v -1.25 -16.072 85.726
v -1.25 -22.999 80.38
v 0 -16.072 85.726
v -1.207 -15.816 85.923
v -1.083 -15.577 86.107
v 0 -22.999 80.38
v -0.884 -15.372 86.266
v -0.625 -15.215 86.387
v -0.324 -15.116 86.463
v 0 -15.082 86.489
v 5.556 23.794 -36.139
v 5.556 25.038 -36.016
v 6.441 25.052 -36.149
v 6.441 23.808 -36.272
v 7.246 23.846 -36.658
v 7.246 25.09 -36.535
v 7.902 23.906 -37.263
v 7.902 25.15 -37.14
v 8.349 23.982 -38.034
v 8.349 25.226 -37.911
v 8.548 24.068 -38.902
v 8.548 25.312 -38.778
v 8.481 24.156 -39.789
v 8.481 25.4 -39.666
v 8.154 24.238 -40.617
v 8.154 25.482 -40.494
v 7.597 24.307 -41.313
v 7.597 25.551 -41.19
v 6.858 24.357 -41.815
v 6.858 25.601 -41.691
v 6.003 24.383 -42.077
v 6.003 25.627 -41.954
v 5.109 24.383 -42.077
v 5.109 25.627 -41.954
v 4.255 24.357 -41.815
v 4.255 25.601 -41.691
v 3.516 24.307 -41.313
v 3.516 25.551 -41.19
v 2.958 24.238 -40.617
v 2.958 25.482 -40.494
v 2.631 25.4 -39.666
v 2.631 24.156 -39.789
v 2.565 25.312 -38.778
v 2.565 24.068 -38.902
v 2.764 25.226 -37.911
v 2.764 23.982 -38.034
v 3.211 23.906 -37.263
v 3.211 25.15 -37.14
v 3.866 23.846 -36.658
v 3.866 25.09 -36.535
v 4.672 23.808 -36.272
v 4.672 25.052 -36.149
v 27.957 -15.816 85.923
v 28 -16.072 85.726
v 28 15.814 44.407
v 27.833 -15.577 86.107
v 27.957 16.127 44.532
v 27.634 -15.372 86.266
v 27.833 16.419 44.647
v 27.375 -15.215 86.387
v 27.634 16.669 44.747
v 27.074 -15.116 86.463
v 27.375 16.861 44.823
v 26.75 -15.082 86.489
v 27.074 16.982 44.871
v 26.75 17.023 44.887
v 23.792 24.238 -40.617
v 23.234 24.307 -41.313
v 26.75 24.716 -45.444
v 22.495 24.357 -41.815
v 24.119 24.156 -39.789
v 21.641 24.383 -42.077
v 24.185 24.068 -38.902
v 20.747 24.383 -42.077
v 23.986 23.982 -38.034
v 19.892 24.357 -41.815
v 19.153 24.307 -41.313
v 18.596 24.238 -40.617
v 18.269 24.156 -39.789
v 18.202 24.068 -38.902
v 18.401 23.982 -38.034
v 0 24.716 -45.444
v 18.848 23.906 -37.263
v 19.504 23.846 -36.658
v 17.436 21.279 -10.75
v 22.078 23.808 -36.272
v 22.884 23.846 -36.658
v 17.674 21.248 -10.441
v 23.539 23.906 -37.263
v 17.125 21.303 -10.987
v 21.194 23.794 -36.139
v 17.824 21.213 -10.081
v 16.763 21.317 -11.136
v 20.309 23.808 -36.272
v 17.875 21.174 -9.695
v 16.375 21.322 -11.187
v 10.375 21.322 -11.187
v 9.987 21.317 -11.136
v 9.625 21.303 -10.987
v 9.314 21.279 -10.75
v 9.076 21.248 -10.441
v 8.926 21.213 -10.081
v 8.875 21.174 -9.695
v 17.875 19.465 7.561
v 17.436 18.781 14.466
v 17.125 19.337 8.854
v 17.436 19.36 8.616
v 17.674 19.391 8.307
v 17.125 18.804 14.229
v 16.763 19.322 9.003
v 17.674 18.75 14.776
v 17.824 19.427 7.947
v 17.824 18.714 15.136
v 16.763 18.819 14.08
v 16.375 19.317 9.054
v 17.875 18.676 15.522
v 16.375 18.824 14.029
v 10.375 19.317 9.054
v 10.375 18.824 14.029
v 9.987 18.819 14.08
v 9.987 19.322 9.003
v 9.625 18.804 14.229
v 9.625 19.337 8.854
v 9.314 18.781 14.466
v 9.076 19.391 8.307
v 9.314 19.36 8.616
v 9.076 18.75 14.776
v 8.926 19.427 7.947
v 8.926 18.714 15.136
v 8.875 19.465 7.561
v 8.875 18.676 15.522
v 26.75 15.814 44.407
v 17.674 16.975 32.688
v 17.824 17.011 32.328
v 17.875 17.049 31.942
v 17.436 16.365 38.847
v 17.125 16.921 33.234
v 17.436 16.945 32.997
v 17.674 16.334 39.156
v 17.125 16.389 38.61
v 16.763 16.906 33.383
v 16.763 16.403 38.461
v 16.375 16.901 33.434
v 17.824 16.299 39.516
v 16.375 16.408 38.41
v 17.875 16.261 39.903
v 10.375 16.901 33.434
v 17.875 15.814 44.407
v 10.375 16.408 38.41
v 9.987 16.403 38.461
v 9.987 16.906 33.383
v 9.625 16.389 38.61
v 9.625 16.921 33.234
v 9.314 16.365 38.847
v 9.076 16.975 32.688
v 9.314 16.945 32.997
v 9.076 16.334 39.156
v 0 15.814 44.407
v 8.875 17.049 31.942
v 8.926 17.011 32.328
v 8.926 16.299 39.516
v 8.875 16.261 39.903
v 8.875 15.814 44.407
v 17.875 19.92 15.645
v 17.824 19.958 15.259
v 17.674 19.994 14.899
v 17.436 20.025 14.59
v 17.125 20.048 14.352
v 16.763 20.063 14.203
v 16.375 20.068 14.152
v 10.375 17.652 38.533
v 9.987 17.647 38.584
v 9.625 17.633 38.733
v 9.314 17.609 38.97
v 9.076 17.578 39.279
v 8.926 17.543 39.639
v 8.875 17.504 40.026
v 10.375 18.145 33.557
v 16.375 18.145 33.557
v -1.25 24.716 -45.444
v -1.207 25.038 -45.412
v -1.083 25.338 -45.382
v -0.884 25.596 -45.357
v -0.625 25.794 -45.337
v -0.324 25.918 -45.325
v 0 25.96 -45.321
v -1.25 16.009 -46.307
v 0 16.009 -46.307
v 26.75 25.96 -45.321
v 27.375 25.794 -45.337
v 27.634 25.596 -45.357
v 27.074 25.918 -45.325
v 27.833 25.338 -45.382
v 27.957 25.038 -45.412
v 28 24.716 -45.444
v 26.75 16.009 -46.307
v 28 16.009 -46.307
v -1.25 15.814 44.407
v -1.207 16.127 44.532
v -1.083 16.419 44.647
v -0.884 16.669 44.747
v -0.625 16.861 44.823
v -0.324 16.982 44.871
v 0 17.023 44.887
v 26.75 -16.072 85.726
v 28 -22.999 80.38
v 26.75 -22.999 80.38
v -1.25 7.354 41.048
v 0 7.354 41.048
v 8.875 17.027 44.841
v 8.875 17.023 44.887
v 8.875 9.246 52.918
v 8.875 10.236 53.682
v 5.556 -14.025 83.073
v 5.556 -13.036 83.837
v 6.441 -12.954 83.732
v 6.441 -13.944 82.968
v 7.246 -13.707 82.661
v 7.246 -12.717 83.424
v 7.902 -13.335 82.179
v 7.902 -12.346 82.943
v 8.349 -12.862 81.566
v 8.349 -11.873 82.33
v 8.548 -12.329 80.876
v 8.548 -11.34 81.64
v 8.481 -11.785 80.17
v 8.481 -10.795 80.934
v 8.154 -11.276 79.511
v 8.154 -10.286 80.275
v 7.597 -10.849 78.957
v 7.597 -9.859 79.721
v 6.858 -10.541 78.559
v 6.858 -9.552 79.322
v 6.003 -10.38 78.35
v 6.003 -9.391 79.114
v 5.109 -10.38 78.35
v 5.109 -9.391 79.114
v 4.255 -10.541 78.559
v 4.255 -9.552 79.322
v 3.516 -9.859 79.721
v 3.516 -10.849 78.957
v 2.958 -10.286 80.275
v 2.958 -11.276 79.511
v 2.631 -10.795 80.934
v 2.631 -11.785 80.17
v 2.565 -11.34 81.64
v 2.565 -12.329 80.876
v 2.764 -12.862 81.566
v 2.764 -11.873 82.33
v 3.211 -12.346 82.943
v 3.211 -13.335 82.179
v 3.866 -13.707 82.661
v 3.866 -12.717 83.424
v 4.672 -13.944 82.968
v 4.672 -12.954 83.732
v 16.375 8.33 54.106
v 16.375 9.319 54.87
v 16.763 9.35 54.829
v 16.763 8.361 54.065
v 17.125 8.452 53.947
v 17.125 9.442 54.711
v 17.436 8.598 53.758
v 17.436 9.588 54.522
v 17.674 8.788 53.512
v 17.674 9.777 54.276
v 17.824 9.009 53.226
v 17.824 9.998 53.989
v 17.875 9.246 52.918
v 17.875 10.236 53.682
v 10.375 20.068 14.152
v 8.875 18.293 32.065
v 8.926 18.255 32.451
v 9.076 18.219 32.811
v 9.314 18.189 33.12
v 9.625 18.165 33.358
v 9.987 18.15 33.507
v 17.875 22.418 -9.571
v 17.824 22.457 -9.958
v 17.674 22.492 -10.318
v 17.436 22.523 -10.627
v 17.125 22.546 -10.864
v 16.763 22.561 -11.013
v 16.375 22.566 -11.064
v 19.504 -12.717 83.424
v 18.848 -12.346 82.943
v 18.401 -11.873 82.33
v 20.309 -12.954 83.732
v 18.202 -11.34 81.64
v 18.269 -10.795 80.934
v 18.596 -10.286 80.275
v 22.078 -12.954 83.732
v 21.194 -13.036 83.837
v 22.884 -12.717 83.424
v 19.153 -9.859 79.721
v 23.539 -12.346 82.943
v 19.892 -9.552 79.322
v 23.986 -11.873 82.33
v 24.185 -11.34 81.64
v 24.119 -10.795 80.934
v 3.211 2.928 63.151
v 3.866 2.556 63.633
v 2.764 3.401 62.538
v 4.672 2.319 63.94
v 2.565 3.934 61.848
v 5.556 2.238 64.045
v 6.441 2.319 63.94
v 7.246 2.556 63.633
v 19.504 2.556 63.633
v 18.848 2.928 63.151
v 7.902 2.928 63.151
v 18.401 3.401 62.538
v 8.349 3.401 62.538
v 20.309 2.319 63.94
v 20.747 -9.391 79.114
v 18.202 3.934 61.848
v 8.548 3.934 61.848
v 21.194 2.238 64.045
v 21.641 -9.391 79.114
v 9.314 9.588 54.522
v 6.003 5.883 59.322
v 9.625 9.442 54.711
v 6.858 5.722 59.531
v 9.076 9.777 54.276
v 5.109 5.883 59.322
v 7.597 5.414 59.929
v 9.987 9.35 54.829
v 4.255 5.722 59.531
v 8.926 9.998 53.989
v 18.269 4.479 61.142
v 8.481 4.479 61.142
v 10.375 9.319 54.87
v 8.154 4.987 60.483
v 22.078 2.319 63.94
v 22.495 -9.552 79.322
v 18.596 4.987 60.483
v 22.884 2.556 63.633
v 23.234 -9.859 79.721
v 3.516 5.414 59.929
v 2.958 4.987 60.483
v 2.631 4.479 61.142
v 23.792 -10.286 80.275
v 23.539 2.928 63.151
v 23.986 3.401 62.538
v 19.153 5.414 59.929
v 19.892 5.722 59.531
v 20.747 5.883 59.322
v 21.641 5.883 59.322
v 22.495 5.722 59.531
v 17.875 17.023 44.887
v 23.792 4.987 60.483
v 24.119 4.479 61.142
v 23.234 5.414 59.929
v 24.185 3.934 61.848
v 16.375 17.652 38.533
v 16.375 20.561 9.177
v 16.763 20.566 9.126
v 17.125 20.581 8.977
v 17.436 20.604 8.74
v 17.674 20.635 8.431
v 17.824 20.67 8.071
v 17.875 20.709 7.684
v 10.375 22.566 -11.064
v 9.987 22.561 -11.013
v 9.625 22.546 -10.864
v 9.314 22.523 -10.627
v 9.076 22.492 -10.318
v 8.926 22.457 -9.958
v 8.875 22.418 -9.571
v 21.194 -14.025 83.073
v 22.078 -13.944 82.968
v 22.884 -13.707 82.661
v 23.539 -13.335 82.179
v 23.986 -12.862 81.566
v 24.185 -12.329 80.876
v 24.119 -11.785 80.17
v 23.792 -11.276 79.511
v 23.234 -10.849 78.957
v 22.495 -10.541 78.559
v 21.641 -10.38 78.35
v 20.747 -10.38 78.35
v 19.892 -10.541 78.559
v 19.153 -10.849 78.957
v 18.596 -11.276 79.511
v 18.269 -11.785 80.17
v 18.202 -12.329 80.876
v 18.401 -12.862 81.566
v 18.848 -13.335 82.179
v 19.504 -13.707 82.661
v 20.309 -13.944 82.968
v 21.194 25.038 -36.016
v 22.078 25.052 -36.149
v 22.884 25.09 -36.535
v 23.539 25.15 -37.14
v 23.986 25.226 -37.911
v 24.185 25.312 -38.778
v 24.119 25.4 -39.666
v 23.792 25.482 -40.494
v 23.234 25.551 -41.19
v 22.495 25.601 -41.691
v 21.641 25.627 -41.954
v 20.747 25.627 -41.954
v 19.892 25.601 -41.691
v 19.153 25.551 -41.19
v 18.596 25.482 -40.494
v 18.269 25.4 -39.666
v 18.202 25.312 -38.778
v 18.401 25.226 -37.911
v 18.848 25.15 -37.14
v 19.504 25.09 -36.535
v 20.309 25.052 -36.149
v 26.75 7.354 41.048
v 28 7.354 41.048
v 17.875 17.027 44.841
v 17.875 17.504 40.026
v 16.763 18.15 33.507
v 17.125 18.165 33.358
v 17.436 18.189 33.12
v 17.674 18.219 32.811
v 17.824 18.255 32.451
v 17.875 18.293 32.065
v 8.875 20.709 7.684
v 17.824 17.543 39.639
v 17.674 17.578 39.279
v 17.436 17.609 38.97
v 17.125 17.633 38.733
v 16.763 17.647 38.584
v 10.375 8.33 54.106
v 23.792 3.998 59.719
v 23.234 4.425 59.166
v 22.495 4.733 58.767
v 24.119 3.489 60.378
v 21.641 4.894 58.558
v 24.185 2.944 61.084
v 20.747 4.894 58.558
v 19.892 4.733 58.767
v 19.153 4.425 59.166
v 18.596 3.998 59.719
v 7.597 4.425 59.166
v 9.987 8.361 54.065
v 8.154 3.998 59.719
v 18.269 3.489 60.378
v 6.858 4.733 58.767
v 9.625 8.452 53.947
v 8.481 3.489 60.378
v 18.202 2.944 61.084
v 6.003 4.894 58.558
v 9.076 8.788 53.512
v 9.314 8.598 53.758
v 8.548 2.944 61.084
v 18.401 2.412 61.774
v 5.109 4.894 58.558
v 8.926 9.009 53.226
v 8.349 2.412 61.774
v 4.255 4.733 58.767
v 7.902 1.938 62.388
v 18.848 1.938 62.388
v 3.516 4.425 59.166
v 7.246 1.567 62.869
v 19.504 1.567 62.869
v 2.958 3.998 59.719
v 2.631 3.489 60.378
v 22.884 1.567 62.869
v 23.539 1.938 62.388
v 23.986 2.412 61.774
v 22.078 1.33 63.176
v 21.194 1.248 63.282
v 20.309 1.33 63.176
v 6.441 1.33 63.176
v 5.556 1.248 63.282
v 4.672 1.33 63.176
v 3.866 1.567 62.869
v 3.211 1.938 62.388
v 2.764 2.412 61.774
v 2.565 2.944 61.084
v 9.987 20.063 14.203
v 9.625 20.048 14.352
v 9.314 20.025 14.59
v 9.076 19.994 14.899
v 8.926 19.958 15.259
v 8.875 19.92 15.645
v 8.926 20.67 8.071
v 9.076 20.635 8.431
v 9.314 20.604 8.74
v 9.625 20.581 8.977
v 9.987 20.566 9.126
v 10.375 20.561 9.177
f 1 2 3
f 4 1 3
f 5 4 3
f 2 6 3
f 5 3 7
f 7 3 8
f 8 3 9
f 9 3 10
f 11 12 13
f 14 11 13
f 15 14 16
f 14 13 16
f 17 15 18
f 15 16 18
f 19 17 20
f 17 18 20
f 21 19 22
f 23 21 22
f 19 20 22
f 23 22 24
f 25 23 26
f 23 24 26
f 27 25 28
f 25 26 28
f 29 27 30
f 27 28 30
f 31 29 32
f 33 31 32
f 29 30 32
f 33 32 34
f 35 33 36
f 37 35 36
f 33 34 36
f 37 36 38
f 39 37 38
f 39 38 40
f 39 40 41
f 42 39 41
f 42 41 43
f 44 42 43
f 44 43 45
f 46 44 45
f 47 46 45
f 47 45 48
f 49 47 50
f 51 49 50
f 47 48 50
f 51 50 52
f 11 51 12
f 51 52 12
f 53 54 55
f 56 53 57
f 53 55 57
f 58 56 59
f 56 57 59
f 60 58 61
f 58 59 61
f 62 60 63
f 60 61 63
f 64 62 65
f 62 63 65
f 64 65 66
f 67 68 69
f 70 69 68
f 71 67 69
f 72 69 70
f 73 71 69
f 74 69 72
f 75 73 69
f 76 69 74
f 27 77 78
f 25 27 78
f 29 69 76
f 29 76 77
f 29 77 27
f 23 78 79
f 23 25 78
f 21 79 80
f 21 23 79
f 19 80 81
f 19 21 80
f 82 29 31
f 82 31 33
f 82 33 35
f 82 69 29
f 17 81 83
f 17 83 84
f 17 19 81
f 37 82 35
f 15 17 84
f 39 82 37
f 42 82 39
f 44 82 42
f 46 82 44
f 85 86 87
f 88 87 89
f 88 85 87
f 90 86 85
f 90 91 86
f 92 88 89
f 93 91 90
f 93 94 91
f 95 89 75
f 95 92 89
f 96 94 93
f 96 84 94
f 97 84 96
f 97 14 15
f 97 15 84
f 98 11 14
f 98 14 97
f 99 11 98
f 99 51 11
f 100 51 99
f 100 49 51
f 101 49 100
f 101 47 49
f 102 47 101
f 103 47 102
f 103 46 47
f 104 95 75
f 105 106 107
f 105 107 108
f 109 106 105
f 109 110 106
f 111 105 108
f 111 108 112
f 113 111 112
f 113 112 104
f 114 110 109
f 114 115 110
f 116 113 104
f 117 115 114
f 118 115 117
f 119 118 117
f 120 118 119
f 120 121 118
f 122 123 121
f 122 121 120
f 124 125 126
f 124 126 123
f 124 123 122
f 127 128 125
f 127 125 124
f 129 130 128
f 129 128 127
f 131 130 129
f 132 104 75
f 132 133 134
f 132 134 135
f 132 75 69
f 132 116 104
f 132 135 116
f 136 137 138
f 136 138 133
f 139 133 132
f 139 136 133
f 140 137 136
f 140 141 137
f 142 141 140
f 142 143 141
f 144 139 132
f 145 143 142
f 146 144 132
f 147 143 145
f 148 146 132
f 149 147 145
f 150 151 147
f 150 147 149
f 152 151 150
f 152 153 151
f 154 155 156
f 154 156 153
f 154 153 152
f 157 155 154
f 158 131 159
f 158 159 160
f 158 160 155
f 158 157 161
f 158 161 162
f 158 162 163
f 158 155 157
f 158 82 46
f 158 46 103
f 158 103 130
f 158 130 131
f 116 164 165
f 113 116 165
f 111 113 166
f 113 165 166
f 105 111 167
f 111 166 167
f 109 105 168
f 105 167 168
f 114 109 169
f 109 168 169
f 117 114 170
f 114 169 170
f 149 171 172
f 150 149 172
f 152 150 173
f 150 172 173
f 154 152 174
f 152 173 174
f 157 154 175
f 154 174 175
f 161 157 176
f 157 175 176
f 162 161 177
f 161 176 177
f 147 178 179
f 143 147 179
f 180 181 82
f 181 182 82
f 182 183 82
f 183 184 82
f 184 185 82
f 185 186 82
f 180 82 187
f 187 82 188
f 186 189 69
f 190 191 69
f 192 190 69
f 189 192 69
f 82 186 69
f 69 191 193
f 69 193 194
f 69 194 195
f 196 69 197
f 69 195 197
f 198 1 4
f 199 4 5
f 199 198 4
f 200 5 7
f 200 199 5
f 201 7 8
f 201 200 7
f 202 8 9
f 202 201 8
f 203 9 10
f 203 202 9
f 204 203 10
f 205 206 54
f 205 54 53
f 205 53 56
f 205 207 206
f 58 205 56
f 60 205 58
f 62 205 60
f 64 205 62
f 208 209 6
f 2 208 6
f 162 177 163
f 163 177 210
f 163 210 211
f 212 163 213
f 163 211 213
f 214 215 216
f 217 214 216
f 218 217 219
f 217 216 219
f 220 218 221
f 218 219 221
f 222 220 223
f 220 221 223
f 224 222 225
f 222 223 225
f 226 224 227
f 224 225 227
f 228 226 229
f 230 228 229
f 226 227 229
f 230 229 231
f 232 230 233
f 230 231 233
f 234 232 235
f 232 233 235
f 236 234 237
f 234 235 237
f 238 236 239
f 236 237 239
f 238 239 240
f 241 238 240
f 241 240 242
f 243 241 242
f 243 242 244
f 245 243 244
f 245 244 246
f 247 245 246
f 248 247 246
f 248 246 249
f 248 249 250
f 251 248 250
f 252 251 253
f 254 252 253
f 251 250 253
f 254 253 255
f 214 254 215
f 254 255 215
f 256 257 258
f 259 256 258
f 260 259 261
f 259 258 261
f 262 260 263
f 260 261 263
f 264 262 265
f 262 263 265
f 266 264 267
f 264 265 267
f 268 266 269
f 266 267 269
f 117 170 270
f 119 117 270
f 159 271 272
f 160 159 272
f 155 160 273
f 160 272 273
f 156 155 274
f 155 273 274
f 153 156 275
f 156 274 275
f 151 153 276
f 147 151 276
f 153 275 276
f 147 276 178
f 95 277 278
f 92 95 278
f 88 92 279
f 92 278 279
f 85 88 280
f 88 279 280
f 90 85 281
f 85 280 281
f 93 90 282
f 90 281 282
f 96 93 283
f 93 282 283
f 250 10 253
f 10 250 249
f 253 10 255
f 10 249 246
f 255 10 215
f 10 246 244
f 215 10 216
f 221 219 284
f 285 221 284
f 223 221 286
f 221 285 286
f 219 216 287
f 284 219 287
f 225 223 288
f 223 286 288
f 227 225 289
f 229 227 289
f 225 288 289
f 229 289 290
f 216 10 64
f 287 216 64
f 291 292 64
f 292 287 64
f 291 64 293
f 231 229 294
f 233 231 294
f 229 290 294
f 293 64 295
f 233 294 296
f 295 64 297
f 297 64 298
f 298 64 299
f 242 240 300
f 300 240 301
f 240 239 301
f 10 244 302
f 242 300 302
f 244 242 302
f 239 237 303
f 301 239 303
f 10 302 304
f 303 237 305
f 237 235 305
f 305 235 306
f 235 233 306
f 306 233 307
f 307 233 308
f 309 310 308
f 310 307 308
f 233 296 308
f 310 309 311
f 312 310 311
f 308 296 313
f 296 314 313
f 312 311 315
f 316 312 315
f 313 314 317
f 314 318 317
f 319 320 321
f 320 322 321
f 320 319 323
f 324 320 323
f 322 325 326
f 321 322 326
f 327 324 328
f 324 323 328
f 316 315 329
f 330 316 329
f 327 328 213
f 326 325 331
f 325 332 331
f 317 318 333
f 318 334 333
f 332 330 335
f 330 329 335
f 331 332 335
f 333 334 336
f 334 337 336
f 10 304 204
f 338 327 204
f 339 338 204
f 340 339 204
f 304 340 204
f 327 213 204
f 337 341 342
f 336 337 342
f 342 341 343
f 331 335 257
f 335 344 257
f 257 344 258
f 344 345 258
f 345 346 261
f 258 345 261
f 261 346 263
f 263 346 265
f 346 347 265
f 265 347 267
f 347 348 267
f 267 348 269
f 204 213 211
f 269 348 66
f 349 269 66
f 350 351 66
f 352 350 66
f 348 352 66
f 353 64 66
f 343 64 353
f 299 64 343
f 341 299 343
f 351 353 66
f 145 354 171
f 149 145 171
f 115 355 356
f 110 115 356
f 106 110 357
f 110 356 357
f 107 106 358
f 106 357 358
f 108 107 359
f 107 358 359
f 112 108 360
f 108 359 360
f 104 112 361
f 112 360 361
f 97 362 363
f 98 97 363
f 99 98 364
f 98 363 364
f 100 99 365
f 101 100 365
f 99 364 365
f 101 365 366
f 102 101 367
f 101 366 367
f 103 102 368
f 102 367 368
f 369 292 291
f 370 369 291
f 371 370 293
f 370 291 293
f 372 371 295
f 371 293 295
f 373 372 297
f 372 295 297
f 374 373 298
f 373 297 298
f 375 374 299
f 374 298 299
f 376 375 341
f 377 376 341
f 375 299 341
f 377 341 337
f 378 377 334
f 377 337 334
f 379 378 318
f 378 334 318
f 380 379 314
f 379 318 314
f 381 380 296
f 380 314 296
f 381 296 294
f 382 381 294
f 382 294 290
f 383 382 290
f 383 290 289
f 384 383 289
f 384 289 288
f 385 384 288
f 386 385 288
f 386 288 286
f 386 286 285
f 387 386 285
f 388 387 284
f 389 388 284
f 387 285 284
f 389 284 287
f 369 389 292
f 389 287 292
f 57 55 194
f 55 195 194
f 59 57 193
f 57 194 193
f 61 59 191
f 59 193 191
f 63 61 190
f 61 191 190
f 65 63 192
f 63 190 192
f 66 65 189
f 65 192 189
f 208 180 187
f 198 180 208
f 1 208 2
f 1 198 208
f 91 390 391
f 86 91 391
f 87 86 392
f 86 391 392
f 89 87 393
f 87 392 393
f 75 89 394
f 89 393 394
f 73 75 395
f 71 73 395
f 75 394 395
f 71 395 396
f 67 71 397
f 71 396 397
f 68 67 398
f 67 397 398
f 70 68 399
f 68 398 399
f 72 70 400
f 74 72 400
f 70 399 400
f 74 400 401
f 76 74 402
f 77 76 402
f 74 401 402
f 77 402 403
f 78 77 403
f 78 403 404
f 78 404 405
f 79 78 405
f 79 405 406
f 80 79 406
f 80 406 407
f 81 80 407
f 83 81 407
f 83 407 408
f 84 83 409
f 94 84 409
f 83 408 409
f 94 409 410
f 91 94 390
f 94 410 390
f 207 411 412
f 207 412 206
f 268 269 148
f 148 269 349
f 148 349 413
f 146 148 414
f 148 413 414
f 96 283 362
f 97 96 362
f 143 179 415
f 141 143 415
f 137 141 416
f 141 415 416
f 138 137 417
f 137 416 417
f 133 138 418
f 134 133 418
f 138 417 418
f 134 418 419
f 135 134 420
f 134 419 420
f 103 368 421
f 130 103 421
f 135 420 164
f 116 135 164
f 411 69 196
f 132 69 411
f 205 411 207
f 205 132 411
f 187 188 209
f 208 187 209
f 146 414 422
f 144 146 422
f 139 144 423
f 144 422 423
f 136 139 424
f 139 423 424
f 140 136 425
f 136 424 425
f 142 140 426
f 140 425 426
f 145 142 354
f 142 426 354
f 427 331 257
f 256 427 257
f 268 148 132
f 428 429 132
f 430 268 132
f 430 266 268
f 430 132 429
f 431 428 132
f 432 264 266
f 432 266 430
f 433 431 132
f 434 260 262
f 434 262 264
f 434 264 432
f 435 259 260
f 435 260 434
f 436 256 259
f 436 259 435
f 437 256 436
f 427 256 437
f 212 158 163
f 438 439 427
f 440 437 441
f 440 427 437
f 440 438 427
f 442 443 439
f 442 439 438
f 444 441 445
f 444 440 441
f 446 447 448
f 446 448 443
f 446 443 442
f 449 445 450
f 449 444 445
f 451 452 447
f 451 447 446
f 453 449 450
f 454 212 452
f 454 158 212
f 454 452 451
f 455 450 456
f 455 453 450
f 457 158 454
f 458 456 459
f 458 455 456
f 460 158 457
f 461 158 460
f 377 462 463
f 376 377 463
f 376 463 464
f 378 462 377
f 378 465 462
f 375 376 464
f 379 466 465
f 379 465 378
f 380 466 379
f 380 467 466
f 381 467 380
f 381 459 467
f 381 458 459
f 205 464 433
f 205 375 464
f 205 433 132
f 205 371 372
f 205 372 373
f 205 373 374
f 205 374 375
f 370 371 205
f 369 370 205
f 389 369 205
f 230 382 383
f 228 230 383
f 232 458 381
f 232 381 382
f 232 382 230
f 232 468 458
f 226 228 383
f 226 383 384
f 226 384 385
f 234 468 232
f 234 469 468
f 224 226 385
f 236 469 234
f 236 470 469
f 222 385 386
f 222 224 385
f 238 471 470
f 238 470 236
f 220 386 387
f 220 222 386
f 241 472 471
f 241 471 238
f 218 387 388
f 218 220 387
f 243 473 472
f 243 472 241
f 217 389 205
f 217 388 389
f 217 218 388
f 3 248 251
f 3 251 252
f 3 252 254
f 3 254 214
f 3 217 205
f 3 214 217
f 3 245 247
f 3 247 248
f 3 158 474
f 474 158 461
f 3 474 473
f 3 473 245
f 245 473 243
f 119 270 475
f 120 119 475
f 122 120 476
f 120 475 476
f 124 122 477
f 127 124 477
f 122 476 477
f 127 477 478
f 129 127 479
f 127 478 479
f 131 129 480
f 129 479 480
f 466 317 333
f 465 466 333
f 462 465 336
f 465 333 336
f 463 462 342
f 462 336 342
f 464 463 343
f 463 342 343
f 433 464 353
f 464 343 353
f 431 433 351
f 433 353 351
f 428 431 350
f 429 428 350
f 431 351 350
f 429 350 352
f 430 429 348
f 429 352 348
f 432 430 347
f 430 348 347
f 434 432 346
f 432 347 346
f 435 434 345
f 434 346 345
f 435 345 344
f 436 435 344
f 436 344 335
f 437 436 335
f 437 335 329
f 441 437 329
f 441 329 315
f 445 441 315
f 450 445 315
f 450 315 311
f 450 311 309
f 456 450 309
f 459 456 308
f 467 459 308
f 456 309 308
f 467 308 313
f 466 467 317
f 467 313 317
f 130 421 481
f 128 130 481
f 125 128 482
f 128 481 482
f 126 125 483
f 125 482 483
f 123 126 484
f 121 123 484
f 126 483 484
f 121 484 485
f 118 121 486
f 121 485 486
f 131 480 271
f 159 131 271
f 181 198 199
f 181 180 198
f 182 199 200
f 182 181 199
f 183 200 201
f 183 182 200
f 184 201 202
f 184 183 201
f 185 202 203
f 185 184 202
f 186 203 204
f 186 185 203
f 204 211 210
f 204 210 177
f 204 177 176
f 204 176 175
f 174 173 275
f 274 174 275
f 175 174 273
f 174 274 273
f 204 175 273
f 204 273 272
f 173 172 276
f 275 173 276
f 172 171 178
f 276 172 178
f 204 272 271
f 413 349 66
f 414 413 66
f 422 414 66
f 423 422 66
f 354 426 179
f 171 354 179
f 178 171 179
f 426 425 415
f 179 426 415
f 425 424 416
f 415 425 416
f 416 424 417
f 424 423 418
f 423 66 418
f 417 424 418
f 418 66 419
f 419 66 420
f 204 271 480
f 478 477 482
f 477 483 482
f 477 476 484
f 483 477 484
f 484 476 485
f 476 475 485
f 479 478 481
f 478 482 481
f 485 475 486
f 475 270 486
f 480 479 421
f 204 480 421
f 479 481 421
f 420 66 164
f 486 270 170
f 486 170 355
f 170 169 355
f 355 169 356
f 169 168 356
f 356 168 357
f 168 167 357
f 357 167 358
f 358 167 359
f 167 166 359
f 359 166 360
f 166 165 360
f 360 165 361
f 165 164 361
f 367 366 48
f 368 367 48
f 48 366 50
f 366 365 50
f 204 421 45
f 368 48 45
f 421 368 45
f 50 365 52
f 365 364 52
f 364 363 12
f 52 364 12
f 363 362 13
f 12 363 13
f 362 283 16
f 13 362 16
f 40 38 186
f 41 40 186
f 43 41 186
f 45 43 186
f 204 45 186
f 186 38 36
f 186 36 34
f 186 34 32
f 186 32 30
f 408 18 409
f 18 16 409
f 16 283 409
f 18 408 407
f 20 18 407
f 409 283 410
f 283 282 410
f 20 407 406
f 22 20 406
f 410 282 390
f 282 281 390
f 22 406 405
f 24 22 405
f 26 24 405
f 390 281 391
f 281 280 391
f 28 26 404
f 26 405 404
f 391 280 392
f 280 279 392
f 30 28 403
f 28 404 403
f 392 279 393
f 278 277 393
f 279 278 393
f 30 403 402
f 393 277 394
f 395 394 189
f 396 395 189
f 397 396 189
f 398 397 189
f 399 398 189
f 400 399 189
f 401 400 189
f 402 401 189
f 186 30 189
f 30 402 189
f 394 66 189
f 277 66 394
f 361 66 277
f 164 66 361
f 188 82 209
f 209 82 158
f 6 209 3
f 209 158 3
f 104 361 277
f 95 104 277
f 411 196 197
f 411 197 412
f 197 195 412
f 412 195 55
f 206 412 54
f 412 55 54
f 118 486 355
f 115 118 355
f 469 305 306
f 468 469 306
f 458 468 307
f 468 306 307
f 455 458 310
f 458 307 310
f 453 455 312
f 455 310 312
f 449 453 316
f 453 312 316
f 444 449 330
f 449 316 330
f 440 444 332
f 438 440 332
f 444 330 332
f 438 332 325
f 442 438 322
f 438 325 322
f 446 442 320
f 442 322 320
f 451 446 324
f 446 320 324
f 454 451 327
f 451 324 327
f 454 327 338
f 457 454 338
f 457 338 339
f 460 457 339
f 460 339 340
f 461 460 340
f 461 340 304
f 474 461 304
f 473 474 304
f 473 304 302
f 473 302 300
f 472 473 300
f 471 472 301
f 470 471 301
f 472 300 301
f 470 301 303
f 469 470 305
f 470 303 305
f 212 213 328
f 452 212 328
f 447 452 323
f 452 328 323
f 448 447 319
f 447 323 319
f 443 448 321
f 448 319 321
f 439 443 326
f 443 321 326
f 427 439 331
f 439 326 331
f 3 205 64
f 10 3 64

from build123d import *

# Parameters (mm, degrees)
BOSS_EXTRUDE1_DEPTH  = 26.75
BOSS_EXTRUDE2_DEPTH  = 1.25
FILLET1_R            = 1.25
FILLET1_OF_MIRROR1_R = 1.25
SKETCH5_R            = 3
CUT_EXTRUDE1_DEPTH   = 1.25
SKETCH6_R            = 3
CUT_EXTRUDE2_DEPTH   = 1.25
CUT_EXTRUDE3_DEPTH   = 1.25
CUT_EXTRUDE4_DEPTH   = 1.25


with BuildPart() as part:
    # Sketch1 → Boss-Extrude1 (new body)
    with BuildSketch(Plane(origin=(0, 0, 0), x_dir=(0, 0, -1), z_dir=(1, 0, 0))):
        Polygon((45.443853174, 24.716321972), (-44.407308019, 15.814225038), (-85.72558755, -16.072016683), (-86.489274142, -15.082429501), (-44.887235053, 17.022795826), (45.320611525, 25.960231734), align=None)
    extrude(amount=BOSS_EXTRUDE1_DEPTH)

    # Sketch2 → Boss-Extrude2 (add)
    with BuildSketch(Plane(origin=(26.75, 0, 0), x_dir=(0, 0, -1), z_dir=(1, 0, 0))):
        Polygon((46.306544717, 16.008953638), (-41.047818784, 7.354229524), (-80.379781408, -22.999126953), (-86.489274142, -15.082429501), (-44.887235053, 17.022795826), (45.320611525, 25.960231734), align=None)
    boss_extrude2 = extrude(amount=BOSS_EXTRUDE2_DEPTH)

    # Fillet1
    fillet1_edges = [part.edges().sort_by_distance(p)[0] for p in [
        (28, 21.49151378, -0.216688236),
        (28, 0.970183162, 65.688254597),
    ]]
    fillet(fillet1_edges, radius=FILLET1_R)

    # Mirror1: Boss-Extrude2 across plane
    add(boss_extrude2.mirror(Plane(origin=(13.375, 0, 0), x_dir=(0, 0, 1), z_dir=(1, 0, 0))))

    # Fillet1 of Mirror1
    fillet1_of_mirror1_edges = [part.edges().sort_by_distance(p)[0] for p in [
        (-1.25, 21.49151378, -0.216688236),
        (-1.25, 0.970183162, 65.688254597),
    ]]
    fillet(fillet1_of_mirror1_edges, radius=FILLET1_OF_MIRROR1_R)

    # Sketch5 → Cut-Extrude1 (cut)
    with BuildSketch(Plane(origin=(0, 21.261342533, 2.106489551), x_dir=(1, 0, 0), z_dir=(0, 0.9951278095775022, 0.09859331927408967))):
        with Locations(Location((5.55625, 41.309306291, 0), (0, 0, 270))):
            Circle(SKETCH5_R)
        with Locations(Location((21.19375, 41.309306291, 0), (0, 0, 270))):
            Circle(SKETCH5_R)
    extrude(amount=-CUT_EXTRUDE1_DEPTH, mode=Mode.SUBTRACT)

    # Sketch6 → Cut-Extrude2 (cut)
    with BuildSketch(Plane(origin=(0, 32.379495301, 24.987981728), x_dir=(1, 0, 0), z_dir=(0, 0.7916697451364806, 0.6109492733734446))):
        with Locations(Location((21.19375, -71.335540962, 0), (0, 0, 270))):
            Circle(SKETCH6_R)
        with Locations(Location((5.55625, -71.335540962, 0), (0, 0, 270))):
            Circle(SKETCH6_R)
        with Locations(Location((5.55625, -46.335540962, 0), (0, 0, 270))):
            Circle(SKETCH6_R)
        with Locations(Location((21.19375, -46.335540962, 0), (0, 0, 270))):
            Circle(SKETCH6_R)
    extrude(amount=-CUT_EXTRUDE2_DEPTH, mode=Mode.SUBTRACT)

    # Sketch7 → Cut-Extrude3 (cut)
    with BuildSketch(Plane(origin=(0, 21.261342533, 2.106489551), x_dir=(1, 0, 0), z_dir=(0, 0.9951278095775022, 0.09859331927408967))):
        with BuildLine():
            Line((8.875, -42.943848047), (17.875, -42.943848047))
            Line((17.875, -42.943848047), (17.875, -38.104983203))
            ThreePointArc((17.875, -38.104983203), (17.435660172, -37.044323031), (16.375, -36.604983203))
            Line((16.375, -36.604983203), (10.375, -36.604983203))
            ThreePointArc((10.375, -36.604983203), (9.314339828, -37.044323031), (8.875, -38.104983203))
            Line((8.875, -38.104983203), (8.875, -42.943848047))
        make_face()
        with BuildLine():
            Line((17.875, -23.604983203), (17.875, -15.104983203))
            Line((17.875, -15.104983203), (17.875, -13.604983203))
            ThreePointArc((17.875, -13.604983203), (17.435660172, -12.544323031), (16.375, -12.104983203))
            Line((16.375, -12.104983203), (10.375, -12.104983203))
            ThreePointArc((10.375, -12.104983203), (9.314339828, -12.544323031), (8.875, -13.604983203))
            Line((8.875, -13.604983203), (8.875, -15.104983203))
            Line((8.875, -15.104983203), (8.875, -23.604983203))
            Line((8.875, -23.604983203), (8.875, -28.604983203))
            Line((8.875, -28.604983203), (8.875, -30.104983203))
            ThreePointArc((8.875, -30.104983203), (9.314339828, -31.165643374), (10.375, -31.604983203))
            Line((10.375, -31.604983203), (16.375, -31.604983203))
            ThreePointArc((16.375, -31.604983203), (17.435660172, -31.165643374), (17.875, -30.104983203))
            Line((17.875, -30.104983203), (17.875, -28.604983203))
            Line((17.875, -28.604983203), (17.875, -23.604983203))
        make_face()
        with BuildLine():
            Line((16.375, 13.235019835), (10.375, 13.235019835))
            ThreePointArc((10.375, 13.235019835), (9.314339828, 12.795680007), (8.875, 11.735019835))
            Line((8.875, 11.735019835), (8.875, -5.604983203))
            ThreePointArc((8.875, -5.604983203), (9.314339828, -6.665643374), (10.375, -7.104983203))
            Line((10.375, -7.104983203), (16.375, -7.104983203))
            ThreePointArc((16.375, -7.104983203), (17.435660172, -6.665643374), (17.875, -5.604983203))
            Line((17.875, -5.604983203), (17.875, 11.735019835))
            ThreePointArc((17.875, 11.735019835), (17.435660172, 12.795680007), (16.375, 13.235019835))
        make_face()
    extrude(amount=-CUT_EXTRUDE3_DEPTH, mode=Mode.SUBTRACT)

    # Sketch8 → Cut-Extrude4 (cut)
    with BuildSketch(Plane(origin=(0, 32.379495301, 24.987981728), x_dir=(1, 0, 0), z_dir=(0, 0.7916697451364806, 0.6109492733734446))):
        with BuildLine():
            Line((8.875, -25.096490852), (8.875, -36.245103825))
            ThreePointArc((8.875, -36.245103825), (9.314339828, -37.305763997), (10.375, -37.745103825))
            Line((10.375, -37.745103825), (16.375, -37.745103825))
            ThreePointArc((16.375, -37.745103825), (17.435660172, -37.305763997), (17.875, -36.245103825))
            Line((17.875, -36.245103825), (17.875, -25.096490852))
            Line((17.875, -25.096490852), (8.875, -25.096490852))
        make_face()
    extrude(amount=-CUT_EXTRUDE4_DEPTH, mode=Mode.SUBTRACT)


solid = part.part
